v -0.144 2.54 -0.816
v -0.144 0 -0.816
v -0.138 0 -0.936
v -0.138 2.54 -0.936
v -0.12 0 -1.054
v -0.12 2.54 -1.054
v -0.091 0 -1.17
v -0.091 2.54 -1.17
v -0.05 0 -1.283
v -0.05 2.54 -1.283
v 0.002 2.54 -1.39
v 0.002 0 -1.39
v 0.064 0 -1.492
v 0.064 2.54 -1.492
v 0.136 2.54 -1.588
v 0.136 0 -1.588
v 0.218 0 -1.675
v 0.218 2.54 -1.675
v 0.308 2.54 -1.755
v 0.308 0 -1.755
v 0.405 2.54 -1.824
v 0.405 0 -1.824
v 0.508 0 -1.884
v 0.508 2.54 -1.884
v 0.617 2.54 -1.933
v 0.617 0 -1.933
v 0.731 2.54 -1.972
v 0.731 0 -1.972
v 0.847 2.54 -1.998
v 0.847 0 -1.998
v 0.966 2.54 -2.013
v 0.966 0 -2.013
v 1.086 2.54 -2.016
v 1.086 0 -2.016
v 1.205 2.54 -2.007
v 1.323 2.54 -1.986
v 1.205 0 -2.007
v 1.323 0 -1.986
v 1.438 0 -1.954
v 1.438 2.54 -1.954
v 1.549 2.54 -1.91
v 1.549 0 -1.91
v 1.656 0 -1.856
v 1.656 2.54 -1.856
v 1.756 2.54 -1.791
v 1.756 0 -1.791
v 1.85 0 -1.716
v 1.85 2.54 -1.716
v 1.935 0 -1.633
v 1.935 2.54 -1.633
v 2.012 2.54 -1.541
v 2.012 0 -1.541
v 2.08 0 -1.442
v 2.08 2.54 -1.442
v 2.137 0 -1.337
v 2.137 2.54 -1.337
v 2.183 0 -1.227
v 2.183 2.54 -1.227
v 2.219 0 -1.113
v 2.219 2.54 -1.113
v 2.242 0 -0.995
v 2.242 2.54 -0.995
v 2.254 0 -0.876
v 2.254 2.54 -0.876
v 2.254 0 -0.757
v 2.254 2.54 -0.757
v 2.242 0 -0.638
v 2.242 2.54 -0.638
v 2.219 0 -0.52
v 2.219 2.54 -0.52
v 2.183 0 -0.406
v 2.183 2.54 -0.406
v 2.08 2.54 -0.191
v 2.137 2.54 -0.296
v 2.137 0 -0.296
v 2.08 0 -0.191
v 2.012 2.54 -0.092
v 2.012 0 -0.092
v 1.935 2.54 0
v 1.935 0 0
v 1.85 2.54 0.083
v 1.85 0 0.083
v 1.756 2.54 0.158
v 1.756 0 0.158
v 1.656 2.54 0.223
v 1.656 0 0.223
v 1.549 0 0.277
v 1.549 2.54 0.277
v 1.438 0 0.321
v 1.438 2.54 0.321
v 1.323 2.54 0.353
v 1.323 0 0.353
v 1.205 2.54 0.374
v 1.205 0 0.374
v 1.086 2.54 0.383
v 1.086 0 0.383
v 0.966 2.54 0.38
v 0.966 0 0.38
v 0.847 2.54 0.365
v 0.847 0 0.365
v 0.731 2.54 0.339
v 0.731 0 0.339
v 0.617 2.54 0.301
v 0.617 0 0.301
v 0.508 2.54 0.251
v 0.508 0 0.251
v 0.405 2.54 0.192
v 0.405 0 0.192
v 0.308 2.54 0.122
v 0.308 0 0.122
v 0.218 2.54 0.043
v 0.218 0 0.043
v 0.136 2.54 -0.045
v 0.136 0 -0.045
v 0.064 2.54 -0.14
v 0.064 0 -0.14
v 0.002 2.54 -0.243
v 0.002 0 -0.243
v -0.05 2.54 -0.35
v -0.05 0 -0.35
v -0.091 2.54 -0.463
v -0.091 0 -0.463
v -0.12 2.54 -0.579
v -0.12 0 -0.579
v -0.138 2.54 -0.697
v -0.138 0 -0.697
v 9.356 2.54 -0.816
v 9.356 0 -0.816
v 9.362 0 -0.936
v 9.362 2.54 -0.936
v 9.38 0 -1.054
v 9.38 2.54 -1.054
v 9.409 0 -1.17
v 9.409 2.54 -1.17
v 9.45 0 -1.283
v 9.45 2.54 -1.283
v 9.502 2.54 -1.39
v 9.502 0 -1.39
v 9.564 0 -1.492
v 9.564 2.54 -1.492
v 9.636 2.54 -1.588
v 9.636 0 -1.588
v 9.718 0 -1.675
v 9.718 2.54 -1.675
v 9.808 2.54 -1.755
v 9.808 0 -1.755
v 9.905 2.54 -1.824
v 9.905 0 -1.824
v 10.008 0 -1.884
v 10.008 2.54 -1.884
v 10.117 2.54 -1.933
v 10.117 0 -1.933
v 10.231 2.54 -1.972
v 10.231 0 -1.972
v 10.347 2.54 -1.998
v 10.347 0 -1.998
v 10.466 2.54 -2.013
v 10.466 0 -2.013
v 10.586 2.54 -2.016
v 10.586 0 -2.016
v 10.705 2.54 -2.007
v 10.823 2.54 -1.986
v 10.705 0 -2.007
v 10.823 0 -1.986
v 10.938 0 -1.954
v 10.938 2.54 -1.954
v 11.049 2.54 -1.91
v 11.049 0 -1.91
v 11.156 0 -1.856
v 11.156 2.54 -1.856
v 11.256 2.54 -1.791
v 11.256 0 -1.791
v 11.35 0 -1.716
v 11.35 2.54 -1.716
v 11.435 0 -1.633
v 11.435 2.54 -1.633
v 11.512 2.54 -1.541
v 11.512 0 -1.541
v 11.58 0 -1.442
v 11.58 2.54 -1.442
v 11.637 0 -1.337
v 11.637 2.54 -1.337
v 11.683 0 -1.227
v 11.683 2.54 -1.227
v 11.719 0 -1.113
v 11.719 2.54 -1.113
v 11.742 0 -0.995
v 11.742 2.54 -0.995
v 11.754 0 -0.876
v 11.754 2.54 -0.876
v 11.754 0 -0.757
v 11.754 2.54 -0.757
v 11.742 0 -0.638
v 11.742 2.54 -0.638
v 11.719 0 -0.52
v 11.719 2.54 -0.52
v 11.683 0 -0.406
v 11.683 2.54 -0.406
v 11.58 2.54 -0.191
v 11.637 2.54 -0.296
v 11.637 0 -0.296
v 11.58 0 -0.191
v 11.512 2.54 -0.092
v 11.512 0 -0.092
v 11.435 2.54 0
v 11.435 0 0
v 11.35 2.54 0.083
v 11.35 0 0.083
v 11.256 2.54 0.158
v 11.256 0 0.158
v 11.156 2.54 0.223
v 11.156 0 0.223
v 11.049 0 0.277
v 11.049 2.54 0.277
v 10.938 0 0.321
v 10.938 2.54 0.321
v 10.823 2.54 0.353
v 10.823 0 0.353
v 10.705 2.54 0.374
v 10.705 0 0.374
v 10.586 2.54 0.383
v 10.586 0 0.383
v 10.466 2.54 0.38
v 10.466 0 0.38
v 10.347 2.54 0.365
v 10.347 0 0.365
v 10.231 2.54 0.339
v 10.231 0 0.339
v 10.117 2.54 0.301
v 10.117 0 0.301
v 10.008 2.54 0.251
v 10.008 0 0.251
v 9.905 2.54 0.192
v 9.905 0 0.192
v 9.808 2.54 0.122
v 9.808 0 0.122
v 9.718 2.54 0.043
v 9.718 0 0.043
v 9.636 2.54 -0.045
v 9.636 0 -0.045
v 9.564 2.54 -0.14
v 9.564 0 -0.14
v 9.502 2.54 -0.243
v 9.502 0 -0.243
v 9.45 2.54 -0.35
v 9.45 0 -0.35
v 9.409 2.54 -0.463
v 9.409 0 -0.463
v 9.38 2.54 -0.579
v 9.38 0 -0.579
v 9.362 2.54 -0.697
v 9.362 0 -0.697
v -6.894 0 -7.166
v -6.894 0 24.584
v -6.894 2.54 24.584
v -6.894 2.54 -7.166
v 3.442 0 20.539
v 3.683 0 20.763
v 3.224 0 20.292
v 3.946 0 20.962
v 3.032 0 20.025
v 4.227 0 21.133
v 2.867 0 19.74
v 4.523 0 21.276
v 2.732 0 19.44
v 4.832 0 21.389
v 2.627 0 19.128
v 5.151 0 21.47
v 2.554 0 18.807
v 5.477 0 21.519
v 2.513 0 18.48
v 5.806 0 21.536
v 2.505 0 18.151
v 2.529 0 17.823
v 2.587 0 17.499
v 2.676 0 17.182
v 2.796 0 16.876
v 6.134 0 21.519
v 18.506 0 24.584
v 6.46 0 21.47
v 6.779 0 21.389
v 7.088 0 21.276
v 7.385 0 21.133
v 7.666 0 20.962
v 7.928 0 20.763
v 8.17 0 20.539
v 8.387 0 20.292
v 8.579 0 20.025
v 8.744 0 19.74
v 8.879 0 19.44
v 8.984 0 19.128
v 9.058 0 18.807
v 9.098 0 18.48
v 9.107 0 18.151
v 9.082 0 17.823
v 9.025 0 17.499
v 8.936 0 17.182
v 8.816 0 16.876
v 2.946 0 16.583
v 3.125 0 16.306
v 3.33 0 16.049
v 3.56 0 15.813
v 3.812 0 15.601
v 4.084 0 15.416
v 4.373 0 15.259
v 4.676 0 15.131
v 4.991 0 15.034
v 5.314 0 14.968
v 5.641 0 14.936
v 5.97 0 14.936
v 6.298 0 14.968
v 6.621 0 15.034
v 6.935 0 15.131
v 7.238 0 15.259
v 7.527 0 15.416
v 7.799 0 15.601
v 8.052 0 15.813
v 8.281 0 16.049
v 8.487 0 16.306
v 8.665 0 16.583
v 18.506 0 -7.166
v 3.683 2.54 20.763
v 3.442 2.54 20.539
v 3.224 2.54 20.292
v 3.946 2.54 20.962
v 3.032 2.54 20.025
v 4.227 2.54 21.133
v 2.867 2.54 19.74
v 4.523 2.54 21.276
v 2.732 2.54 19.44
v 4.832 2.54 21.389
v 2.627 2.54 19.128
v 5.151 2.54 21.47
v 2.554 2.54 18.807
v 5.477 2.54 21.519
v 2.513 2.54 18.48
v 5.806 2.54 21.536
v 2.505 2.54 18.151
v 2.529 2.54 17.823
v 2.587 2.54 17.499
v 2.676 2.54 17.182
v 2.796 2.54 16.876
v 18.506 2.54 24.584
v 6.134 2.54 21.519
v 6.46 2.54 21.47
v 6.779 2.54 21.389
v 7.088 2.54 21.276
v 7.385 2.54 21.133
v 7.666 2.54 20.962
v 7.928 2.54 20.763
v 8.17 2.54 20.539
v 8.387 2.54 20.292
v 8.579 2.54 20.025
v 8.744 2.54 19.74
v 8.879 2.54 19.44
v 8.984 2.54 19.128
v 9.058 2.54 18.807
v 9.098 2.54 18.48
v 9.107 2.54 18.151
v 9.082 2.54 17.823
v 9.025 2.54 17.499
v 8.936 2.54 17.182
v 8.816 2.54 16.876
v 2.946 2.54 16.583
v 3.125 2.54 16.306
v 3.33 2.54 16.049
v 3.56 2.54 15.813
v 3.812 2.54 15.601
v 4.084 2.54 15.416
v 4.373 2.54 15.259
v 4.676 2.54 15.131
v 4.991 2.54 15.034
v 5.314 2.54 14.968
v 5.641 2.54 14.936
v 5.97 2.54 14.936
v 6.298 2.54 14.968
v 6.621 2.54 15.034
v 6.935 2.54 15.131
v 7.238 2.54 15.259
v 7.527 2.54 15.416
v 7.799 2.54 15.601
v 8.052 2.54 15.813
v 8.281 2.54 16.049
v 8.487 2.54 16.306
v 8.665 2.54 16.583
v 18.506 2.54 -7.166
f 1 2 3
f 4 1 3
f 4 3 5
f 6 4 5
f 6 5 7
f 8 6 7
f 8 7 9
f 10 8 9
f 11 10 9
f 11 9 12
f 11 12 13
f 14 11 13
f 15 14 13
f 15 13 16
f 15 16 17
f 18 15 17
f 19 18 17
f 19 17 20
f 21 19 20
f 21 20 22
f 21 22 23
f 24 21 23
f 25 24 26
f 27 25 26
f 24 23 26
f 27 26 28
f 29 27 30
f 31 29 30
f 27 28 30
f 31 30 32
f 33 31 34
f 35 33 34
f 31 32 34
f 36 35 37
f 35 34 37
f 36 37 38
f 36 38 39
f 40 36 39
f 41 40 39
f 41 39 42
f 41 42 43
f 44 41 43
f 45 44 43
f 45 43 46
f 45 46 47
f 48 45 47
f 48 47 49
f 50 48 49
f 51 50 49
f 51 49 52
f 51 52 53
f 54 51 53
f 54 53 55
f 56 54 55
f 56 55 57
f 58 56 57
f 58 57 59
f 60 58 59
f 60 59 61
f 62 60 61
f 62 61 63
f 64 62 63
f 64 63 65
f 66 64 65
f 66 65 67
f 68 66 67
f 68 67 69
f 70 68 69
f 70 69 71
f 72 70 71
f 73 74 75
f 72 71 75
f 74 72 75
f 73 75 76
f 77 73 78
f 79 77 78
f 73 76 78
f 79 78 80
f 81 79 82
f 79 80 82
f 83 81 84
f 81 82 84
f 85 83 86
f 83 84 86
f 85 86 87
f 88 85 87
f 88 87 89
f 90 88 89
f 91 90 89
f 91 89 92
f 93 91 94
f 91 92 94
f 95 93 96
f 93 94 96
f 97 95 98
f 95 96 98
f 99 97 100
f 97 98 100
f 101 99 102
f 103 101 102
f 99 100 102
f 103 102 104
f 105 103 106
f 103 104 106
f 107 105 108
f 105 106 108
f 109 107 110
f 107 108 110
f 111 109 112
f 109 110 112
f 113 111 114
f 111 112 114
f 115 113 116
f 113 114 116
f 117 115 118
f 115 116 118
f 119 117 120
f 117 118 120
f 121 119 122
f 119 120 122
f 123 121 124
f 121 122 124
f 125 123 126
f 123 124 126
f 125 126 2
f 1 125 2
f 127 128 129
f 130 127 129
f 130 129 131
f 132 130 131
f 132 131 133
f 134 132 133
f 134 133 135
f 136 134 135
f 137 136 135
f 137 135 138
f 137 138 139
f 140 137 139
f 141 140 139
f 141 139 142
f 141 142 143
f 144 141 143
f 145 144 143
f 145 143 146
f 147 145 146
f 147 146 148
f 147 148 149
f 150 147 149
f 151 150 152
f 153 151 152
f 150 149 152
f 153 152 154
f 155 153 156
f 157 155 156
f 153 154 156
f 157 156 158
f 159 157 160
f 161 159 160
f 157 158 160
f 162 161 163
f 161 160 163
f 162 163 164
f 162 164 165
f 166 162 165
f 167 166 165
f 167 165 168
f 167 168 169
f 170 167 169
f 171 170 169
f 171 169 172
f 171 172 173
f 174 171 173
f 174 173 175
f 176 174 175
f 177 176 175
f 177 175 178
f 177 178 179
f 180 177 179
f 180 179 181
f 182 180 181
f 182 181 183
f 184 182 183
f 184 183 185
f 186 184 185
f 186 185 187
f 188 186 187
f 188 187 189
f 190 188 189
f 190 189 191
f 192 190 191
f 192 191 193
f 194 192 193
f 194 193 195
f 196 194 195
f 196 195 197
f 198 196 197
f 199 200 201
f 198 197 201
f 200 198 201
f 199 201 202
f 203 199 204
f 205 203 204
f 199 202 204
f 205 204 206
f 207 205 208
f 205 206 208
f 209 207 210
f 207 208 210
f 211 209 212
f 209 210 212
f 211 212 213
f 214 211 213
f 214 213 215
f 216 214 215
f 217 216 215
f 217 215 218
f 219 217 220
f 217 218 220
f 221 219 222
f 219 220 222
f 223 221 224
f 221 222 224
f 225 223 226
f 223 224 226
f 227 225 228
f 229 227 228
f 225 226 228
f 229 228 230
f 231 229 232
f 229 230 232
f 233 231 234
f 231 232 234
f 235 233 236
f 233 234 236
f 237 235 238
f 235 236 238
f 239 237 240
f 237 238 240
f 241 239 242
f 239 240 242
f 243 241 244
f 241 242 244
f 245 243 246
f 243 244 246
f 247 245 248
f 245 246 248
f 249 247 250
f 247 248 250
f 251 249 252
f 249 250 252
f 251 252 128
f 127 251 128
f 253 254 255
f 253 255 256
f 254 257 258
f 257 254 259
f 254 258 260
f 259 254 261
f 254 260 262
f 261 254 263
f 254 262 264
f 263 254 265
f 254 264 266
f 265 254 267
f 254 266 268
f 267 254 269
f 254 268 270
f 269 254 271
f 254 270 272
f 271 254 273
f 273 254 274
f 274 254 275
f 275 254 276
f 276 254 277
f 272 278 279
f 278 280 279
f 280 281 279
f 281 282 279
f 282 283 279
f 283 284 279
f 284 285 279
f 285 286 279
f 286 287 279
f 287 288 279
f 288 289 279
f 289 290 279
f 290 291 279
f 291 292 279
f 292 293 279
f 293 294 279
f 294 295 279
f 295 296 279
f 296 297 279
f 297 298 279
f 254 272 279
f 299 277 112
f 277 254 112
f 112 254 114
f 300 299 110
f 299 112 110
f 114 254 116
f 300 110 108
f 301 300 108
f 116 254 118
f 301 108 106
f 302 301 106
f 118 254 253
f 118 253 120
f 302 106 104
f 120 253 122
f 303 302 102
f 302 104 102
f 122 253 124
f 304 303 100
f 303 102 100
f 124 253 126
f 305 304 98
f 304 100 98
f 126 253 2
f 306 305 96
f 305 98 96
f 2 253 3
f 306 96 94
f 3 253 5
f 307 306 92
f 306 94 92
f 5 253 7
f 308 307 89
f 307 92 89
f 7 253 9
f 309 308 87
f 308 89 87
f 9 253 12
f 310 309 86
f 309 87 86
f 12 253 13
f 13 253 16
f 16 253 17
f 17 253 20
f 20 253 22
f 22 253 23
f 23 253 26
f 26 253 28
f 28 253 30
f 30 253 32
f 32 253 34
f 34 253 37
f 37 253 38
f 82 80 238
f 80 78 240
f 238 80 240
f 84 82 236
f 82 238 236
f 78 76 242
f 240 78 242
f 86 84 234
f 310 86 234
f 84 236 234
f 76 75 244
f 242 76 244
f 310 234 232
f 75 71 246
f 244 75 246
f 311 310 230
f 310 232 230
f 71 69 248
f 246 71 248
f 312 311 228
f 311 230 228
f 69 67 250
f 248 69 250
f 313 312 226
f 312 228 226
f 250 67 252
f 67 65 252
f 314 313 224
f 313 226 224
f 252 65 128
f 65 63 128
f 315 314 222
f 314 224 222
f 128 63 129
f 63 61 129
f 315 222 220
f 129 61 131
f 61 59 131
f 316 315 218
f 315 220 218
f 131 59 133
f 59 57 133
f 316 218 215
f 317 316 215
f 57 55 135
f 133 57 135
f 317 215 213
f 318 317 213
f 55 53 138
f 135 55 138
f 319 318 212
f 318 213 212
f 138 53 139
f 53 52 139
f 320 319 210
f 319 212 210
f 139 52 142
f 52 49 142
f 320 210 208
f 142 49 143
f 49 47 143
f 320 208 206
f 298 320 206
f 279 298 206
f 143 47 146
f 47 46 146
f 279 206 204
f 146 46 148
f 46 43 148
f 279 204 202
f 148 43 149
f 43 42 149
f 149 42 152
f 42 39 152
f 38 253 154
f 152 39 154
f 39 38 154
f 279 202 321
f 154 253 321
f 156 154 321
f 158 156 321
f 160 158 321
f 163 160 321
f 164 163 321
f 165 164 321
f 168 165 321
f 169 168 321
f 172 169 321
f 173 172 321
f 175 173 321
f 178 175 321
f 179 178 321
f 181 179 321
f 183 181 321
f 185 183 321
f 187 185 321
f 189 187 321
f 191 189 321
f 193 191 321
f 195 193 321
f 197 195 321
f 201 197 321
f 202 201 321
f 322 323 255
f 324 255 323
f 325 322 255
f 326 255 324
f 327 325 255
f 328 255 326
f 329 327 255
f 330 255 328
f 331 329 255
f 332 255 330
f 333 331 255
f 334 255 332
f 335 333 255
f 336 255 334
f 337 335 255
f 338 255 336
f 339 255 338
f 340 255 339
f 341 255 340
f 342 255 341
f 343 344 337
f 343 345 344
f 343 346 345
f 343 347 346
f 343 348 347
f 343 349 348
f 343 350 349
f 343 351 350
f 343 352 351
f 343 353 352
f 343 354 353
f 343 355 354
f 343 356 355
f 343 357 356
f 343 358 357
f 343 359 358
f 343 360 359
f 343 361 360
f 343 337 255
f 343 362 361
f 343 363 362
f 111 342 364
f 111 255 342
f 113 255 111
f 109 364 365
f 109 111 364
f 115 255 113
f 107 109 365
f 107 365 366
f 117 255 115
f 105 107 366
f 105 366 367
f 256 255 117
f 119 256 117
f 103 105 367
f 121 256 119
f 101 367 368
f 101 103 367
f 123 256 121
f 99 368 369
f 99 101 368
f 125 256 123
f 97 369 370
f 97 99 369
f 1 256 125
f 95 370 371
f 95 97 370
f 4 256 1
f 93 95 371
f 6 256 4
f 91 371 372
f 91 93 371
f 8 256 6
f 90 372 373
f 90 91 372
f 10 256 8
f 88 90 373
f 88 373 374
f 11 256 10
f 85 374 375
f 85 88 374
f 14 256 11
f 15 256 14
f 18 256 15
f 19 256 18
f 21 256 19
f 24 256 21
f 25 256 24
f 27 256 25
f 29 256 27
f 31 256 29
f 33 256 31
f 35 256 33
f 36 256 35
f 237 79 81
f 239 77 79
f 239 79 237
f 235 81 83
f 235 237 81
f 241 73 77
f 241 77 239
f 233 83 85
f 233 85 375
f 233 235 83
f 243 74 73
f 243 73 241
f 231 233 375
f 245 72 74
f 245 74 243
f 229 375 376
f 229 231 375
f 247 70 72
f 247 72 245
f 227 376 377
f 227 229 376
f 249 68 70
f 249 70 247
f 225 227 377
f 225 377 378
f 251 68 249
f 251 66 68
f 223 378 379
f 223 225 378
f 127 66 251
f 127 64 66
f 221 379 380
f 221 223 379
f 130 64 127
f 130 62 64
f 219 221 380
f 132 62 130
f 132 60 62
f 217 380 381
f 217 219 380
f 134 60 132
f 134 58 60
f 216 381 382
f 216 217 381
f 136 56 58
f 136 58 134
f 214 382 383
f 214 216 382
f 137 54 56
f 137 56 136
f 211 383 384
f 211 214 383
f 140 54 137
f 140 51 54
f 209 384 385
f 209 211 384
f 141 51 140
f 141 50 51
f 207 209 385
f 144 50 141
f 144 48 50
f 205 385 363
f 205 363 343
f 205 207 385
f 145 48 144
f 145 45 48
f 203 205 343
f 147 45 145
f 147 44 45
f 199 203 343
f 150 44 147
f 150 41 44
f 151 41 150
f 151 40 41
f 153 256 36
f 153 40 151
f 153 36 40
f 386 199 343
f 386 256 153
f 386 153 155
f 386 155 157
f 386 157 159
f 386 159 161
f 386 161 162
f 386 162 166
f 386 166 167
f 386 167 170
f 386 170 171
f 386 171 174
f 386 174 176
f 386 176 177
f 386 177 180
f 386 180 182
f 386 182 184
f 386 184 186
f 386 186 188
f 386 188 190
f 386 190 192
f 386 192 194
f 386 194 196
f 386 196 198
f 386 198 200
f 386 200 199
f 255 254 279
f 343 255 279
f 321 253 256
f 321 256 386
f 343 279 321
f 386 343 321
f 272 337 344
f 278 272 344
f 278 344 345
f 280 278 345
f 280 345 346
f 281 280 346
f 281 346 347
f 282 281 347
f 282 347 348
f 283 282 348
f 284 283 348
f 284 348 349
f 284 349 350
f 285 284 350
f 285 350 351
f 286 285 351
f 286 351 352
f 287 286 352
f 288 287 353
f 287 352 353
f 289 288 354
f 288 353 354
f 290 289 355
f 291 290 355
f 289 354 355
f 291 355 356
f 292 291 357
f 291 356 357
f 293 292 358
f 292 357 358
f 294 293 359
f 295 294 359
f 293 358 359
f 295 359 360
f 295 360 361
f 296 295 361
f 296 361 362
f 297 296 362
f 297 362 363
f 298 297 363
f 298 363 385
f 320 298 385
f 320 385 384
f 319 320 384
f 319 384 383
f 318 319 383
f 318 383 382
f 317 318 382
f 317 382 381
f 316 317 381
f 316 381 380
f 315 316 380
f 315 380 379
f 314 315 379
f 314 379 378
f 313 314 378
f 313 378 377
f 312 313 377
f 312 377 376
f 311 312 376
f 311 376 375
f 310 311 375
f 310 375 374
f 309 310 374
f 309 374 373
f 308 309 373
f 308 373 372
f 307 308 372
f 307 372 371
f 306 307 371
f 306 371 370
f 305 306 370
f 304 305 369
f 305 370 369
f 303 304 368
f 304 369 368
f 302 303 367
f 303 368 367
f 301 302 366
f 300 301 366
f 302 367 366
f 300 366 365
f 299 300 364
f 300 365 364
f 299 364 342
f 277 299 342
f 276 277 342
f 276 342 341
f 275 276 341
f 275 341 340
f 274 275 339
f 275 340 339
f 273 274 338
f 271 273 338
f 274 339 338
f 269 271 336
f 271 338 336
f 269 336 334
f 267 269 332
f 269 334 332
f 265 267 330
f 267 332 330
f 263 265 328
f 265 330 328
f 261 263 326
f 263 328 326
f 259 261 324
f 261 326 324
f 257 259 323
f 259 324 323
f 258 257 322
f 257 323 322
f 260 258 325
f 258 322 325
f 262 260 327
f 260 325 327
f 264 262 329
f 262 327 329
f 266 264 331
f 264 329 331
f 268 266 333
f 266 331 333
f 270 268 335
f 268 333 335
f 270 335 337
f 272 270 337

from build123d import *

# Parameters (mm, degrees)
SKETCH2_W                  = 25.4
SKETCH2_H                  = 31.75
BOSS_EXTRUDE1_DEPTH        = 2.54
F_2_4_2_4_DIAMETER_SLOT2_D = 2.4
SKETCH10_R                 = 3.302
CUT_EXTRUDE1_DEPTH         = 3.175


with BuildPart() as part:
    # Sketch2 → Boss-Extrude1 (new body)
    with BuildSketch(Plane(origin=(0, 0, 0), x_dir=(1, 0, 0), z_dir=(0, 1, 0))):
        with Locations((5.805714286, -8.708571429)):
            Rectangle(SKETCH2_W, SKETCH2_H)
    extrude(amount=BOSS_EXTRUDE1_DEPTH)

    # Ø2.4 (2.4) Diameter Slot2 (through all)
    with Locations(Plane(origin=(0, 2.54, 0), x_dir=(1, 0, 0), z_dir=(0, 1, 0))):
        with Locations((1.055714286, 0.816428571), (10.555714286, 0.816428571)):
            Hole(F_2_4_2_4_DIAMETER_SLOT2_D / 2)

    # Sketch10 → Cut-Extrude1 (cut)
    with BuildSketch(Plane(origin=(0, 2.54, 0), x_dir=(1, 0, 0), z_dir=(0, 1, 0))):
        with Locations(Location((5.805714286, -18.233571429, 0), (0, 0, 270))):
            Circle(SKETCH10_R)
    extrude(amount=-CUT_EXTRUDE1_DEPTH, mode=Mode.SUBTRACT)


solid = part.part
